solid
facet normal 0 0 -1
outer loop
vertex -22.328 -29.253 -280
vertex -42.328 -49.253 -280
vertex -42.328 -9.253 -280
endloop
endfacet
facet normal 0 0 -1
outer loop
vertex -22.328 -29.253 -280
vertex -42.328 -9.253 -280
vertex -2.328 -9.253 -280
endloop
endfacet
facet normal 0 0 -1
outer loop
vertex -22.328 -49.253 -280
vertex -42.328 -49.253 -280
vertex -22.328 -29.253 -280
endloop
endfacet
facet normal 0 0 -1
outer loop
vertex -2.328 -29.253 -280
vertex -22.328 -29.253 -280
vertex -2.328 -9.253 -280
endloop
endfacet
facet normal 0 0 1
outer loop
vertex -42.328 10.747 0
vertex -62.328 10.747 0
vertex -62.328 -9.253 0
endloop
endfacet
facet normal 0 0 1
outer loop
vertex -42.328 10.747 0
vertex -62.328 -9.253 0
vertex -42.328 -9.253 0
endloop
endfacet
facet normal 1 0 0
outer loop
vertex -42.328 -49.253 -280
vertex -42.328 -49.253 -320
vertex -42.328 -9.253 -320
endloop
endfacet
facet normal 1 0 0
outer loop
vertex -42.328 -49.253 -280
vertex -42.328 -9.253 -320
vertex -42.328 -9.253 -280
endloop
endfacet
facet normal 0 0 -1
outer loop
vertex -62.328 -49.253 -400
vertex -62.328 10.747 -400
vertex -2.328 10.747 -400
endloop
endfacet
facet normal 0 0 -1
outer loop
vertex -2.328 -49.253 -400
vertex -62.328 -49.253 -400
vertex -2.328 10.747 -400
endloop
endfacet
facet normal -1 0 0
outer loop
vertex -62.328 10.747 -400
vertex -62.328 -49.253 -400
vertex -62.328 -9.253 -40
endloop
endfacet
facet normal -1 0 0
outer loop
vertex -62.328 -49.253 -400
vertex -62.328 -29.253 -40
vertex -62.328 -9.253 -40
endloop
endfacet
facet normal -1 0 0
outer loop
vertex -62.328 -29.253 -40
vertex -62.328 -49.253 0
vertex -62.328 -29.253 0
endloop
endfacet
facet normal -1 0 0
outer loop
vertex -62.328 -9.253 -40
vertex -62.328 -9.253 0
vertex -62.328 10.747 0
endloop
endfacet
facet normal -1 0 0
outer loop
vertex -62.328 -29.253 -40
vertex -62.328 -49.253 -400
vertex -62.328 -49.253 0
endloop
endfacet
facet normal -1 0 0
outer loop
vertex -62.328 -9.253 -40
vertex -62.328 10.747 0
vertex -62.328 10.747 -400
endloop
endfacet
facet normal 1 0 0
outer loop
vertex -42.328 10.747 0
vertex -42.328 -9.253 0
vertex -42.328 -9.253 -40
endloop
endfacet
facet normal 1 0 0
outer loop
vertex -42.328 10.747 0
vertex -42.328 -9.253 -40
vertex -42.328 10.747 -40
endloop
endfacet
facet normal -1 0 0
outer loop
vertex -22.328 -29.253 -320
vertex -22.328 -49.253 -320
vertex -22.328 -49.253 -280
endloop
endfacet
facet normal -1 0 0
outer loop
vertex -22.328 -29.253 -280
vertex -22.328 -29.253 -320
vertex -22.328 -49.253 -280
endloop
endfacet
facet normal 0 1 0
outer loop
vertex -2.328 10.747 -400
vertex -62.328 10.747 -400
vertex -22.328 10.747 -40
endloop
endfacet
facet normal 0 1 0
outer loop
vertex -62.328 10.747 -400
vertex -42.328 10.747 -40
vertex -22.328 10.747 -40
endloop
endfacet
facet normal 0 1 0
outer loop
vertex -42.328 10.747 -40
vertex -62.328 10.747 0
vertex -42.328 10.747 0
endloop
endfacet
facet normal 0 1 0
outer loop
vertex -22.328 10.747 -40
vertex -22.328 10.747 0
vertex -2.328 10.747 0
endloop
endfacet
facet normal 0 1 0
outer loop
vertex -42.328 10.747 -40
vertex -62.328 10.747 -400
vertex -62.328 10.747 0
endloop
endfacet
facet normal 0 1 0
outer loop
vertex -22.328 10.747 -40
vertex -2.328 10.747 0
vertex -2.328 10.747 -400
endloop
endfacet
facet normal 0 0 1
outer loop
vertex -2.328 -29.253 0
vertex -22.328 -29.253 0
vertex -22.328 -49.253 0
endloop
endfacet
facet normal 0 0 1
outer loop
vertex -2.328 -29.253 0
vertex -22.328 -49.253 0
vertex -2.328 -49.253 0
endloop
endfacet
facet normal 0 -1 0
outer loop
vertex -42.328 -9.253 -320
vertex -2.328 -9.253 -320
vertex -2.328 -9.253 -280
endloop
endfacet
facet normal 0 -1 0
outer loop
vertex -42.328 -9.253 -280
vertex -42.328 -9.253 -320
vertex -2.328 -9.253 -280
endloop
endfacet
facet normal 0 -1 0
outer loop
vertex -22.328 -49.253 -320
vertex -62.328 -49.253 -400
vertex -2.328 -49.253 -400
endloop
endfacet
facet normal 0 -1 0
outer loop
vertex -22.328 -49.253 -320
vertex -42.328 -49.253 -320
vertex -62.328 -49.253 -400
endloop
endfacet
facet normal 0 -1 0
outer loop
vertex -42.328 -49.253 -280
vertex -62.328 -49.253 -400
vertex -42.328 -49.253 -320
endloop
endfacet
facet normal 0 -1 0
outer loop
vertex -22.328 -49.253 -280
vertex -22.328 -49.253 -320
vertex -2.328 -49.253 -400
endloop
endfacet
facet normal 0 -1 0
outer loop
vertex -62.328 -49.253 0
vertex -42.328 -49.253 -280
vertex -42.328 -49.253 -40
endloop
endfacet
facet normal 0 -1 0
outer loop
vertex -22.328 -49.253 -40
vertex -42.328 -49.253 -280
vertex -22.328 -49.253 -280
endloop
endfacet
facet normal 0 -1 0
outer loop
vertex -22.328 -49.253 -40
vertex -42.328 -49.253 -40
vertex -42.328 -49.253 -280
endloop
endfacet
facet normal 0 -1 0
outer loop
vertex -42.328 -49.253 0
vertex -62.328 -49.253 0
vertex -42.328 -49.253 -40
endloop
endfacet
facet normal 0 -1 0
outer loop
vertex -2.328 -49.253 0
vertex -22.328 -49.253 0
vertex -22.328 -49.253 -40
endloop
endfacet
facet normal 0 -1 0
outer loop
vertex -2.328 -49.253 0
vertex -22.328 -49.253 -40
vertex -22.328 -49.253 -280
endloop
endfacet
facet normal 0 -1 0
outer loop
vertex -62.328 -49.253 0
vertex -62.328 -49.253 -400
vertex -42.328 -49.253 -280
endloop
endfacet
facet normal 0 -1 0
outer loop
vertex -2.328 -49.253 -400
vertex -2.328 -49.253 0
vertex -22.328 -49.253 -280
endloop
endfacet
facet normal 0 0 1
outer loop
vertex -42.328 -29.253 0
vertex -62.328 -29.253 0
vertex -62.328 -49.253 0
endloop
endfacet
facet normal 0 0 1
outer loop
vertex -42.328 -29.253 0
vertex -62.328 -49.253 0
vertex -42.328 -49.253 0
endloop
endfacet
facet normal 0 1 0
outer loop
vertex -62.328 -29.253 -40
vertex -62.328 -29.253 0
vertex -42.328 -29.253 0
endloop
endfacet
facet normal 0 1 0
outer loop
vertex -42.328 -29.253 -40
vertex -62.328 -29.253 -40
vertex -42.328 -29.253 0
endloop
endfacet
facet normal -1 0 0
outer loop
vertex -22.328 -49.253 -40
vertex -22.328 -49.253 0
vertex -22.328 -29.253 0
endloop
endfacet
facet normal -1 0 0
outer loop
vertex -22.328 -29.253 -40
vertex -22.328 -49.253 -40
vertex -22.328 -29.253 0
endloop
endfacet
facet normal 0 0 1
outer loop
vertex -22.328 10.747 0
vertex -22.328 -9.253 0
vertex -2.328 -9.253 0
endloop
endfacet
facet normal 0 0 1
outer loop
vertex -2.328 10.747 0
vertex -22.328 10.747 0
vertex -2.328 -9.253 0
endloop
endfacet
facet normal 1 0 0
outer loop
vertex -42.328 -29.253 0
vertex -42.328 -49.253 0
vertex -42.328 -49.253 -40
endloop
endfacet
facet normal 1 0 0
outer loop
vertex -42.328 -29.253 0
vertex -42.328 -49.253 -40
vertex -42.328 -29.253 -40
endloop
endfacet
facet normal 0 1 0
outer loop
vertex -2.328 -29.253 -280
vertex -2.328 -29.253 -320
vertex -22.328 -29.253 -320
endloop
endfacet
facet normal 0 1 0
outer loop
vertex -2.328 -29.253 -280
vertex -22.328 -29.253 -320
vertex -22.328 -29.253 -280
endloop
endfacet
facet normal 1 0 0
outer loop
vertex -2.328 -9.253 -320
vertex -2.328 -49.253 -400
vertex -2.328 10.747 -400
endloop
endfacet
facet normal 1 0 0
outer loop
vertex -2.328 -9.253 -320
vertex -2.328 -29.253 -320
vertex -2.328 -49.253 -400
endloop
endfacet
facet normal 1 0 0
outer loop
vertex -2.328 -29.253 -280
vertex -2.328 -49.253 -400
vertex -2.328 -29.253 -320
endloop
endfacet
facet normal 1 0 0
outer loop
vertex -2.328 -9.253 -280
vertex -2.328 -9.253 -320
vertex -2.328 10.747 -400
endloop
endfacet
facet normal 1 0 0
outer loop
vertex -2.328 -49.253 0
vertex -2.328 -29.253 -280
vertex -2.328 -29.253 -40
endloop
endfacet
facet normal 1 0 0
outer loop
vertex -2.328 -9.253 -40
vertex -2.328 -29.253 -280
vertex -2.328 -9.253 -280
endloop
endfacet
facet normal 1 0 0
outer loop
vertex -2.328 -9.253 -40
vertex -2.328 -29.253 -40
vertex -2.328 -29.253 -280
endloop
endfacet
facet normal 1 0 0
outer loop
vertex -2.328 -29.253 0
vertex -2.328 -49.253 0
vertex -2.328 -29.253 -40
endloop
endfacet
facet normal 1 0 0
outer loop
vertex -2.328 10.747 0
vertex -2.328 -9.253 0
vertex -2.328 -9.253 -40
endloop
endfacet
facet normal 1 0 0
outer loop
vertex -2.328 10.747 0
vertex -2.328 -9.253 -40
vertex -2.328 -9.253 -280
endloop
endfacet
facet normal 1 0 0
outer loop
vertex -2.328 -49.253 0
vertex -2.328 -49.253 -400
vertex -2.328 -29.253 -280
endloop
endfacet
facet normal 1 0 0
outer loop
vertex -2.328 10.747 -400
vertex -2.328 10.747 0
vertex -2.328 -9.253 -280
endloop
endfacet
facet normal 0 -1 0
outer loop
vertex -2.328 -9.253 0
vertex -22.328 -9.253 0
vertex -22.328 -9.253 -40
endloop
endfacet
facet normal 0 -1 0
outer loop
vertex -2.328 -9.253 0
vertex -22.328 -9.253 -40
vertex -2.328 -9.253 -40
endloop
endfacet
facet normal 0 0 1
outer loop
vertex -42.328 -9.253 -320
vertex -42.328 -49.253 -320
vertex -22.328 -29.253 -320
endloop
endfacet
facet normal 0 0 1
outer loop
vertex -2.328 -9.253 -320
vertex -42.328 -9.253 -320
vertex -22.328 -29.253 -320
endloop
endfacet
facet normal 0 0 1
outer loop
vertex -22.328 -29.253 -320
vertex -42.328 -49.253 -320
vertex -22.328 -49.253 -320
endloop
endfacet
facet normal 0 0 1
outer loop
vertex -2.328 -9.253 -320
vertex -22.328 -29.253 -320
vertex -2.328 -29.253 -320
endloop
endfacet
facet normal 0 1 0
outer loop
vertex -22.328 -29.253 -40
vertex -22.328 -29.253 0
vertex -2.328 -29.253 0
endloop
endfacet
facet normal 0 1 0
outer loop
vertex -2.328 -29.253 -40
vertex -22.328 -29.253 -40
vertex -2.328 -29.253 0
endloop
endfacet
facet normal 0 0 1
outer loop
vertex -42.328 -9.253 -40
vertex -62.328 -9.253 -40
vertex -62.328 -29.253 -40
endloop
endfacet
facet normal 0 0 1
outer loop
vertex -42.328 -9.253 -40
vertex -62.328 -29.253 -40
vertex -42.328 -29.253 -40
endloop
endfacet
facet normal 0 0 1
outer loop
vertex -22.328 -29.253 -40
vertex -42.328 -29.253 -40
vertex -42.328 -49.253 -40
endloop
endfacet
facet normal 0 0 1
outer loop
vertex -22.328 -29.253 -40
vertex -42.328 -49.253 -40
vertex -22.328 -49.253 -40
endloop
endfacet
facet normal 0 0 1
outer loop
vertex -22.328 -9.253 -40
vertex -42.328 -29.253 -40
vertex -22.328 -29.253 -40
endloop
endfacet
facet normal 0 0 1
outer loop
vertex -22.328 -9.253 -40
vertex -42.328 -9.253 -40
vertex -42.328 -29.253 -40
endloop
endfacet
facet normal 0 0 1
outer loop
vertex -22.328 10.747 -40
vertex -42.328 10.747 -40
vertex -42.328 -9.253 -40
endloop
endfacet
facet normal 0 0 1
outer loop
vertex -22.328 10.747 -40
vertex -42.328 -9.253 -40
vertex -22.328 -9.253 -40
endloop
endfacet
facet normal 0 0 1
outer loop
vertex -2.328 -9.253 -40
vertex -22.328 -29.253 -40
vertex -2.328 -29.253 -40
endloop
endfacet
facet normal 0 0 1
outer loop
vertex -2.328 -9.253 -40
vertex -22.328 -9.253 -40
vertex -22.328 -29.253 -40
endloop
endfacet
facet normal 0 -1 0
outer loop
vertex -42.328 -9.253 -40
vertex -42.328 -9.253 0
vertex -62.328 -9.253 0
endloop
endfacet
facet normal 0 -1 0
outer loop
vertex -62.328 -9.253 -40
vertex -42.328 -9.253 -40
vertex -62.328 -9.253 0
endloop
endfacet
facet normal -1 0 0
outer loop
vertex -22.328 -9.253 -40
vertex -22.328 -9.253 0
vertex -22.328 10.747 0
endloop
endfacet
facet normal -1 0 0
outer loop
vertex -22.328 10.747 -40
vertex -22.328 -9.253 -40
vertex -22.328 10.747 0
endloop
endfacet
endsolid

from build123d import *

# Parameters (mm, degrees)
F0_W     = 60
F0_H     = 60
F1_DEPTH = 400
F2_W     = 20
F2_H     = 20
F3_DEPTH = 40
F4_W     = 20
F4_H     = 40
F5_DEPTH = 40
F6_W     = 20
F6_H     = 40
F7_DEPTH = 40


with BuildPart() as f1:
    # F0 (on Top) → F1 (new body)
    with BuildSketch(Plane.XY):
        with Locations((-32.3275837302, -19.2534299031)):
            Rectangle(F0_W, F0_H)
    extrude(amount=-F1_DEPTH)

    # F2 (on face) → F3 (cut)
    with BuildSketch(Plane.XY):
        with Locations((-32.3275837302, -19.2534299031)):
            Rectangle(F2_W, F2_H)
        with Locations((-52.3275837302, -19.2534299031)):
            Rectangle(F2_W, F2_H)
        with Locations((-32.3275837302, 0.7465700969)):
            Rectangle(F2_W, F2_H)
        with Locations((-12.3275837302, -19.2534299031)):
            Rectangle(F2_W, F2_H)
        with Locations((-32.3275837302, -39.2534299031)):
            Rectangle(F2_W, F2_H)
    extrude(amount=-F3_DEPTH, mode=Mode.SUBTRACT)

    # F4 (on face) → F5 (cut)
    with BuildSketch(Plane.XZ.offset(49.2534299031)):
        with Locations((-32.3275837302, -300)):
            Rectangle(F4_W, F4_H)
    extrude(amount=-F5_DEPTH, mode=Mode.SUBTRACT)

    # F6 (on face) → F7 (cut)
    with BuildSketch(Plane.YZ.offset(-2.3275837302)):
        with Locations((-19.2534299031, -300)):
            Rectangle(F6_W, F6_H)
    extrude(amount=-F7_DEPTH, mode=Mode.SUBTRACT)


solid = f1.part
